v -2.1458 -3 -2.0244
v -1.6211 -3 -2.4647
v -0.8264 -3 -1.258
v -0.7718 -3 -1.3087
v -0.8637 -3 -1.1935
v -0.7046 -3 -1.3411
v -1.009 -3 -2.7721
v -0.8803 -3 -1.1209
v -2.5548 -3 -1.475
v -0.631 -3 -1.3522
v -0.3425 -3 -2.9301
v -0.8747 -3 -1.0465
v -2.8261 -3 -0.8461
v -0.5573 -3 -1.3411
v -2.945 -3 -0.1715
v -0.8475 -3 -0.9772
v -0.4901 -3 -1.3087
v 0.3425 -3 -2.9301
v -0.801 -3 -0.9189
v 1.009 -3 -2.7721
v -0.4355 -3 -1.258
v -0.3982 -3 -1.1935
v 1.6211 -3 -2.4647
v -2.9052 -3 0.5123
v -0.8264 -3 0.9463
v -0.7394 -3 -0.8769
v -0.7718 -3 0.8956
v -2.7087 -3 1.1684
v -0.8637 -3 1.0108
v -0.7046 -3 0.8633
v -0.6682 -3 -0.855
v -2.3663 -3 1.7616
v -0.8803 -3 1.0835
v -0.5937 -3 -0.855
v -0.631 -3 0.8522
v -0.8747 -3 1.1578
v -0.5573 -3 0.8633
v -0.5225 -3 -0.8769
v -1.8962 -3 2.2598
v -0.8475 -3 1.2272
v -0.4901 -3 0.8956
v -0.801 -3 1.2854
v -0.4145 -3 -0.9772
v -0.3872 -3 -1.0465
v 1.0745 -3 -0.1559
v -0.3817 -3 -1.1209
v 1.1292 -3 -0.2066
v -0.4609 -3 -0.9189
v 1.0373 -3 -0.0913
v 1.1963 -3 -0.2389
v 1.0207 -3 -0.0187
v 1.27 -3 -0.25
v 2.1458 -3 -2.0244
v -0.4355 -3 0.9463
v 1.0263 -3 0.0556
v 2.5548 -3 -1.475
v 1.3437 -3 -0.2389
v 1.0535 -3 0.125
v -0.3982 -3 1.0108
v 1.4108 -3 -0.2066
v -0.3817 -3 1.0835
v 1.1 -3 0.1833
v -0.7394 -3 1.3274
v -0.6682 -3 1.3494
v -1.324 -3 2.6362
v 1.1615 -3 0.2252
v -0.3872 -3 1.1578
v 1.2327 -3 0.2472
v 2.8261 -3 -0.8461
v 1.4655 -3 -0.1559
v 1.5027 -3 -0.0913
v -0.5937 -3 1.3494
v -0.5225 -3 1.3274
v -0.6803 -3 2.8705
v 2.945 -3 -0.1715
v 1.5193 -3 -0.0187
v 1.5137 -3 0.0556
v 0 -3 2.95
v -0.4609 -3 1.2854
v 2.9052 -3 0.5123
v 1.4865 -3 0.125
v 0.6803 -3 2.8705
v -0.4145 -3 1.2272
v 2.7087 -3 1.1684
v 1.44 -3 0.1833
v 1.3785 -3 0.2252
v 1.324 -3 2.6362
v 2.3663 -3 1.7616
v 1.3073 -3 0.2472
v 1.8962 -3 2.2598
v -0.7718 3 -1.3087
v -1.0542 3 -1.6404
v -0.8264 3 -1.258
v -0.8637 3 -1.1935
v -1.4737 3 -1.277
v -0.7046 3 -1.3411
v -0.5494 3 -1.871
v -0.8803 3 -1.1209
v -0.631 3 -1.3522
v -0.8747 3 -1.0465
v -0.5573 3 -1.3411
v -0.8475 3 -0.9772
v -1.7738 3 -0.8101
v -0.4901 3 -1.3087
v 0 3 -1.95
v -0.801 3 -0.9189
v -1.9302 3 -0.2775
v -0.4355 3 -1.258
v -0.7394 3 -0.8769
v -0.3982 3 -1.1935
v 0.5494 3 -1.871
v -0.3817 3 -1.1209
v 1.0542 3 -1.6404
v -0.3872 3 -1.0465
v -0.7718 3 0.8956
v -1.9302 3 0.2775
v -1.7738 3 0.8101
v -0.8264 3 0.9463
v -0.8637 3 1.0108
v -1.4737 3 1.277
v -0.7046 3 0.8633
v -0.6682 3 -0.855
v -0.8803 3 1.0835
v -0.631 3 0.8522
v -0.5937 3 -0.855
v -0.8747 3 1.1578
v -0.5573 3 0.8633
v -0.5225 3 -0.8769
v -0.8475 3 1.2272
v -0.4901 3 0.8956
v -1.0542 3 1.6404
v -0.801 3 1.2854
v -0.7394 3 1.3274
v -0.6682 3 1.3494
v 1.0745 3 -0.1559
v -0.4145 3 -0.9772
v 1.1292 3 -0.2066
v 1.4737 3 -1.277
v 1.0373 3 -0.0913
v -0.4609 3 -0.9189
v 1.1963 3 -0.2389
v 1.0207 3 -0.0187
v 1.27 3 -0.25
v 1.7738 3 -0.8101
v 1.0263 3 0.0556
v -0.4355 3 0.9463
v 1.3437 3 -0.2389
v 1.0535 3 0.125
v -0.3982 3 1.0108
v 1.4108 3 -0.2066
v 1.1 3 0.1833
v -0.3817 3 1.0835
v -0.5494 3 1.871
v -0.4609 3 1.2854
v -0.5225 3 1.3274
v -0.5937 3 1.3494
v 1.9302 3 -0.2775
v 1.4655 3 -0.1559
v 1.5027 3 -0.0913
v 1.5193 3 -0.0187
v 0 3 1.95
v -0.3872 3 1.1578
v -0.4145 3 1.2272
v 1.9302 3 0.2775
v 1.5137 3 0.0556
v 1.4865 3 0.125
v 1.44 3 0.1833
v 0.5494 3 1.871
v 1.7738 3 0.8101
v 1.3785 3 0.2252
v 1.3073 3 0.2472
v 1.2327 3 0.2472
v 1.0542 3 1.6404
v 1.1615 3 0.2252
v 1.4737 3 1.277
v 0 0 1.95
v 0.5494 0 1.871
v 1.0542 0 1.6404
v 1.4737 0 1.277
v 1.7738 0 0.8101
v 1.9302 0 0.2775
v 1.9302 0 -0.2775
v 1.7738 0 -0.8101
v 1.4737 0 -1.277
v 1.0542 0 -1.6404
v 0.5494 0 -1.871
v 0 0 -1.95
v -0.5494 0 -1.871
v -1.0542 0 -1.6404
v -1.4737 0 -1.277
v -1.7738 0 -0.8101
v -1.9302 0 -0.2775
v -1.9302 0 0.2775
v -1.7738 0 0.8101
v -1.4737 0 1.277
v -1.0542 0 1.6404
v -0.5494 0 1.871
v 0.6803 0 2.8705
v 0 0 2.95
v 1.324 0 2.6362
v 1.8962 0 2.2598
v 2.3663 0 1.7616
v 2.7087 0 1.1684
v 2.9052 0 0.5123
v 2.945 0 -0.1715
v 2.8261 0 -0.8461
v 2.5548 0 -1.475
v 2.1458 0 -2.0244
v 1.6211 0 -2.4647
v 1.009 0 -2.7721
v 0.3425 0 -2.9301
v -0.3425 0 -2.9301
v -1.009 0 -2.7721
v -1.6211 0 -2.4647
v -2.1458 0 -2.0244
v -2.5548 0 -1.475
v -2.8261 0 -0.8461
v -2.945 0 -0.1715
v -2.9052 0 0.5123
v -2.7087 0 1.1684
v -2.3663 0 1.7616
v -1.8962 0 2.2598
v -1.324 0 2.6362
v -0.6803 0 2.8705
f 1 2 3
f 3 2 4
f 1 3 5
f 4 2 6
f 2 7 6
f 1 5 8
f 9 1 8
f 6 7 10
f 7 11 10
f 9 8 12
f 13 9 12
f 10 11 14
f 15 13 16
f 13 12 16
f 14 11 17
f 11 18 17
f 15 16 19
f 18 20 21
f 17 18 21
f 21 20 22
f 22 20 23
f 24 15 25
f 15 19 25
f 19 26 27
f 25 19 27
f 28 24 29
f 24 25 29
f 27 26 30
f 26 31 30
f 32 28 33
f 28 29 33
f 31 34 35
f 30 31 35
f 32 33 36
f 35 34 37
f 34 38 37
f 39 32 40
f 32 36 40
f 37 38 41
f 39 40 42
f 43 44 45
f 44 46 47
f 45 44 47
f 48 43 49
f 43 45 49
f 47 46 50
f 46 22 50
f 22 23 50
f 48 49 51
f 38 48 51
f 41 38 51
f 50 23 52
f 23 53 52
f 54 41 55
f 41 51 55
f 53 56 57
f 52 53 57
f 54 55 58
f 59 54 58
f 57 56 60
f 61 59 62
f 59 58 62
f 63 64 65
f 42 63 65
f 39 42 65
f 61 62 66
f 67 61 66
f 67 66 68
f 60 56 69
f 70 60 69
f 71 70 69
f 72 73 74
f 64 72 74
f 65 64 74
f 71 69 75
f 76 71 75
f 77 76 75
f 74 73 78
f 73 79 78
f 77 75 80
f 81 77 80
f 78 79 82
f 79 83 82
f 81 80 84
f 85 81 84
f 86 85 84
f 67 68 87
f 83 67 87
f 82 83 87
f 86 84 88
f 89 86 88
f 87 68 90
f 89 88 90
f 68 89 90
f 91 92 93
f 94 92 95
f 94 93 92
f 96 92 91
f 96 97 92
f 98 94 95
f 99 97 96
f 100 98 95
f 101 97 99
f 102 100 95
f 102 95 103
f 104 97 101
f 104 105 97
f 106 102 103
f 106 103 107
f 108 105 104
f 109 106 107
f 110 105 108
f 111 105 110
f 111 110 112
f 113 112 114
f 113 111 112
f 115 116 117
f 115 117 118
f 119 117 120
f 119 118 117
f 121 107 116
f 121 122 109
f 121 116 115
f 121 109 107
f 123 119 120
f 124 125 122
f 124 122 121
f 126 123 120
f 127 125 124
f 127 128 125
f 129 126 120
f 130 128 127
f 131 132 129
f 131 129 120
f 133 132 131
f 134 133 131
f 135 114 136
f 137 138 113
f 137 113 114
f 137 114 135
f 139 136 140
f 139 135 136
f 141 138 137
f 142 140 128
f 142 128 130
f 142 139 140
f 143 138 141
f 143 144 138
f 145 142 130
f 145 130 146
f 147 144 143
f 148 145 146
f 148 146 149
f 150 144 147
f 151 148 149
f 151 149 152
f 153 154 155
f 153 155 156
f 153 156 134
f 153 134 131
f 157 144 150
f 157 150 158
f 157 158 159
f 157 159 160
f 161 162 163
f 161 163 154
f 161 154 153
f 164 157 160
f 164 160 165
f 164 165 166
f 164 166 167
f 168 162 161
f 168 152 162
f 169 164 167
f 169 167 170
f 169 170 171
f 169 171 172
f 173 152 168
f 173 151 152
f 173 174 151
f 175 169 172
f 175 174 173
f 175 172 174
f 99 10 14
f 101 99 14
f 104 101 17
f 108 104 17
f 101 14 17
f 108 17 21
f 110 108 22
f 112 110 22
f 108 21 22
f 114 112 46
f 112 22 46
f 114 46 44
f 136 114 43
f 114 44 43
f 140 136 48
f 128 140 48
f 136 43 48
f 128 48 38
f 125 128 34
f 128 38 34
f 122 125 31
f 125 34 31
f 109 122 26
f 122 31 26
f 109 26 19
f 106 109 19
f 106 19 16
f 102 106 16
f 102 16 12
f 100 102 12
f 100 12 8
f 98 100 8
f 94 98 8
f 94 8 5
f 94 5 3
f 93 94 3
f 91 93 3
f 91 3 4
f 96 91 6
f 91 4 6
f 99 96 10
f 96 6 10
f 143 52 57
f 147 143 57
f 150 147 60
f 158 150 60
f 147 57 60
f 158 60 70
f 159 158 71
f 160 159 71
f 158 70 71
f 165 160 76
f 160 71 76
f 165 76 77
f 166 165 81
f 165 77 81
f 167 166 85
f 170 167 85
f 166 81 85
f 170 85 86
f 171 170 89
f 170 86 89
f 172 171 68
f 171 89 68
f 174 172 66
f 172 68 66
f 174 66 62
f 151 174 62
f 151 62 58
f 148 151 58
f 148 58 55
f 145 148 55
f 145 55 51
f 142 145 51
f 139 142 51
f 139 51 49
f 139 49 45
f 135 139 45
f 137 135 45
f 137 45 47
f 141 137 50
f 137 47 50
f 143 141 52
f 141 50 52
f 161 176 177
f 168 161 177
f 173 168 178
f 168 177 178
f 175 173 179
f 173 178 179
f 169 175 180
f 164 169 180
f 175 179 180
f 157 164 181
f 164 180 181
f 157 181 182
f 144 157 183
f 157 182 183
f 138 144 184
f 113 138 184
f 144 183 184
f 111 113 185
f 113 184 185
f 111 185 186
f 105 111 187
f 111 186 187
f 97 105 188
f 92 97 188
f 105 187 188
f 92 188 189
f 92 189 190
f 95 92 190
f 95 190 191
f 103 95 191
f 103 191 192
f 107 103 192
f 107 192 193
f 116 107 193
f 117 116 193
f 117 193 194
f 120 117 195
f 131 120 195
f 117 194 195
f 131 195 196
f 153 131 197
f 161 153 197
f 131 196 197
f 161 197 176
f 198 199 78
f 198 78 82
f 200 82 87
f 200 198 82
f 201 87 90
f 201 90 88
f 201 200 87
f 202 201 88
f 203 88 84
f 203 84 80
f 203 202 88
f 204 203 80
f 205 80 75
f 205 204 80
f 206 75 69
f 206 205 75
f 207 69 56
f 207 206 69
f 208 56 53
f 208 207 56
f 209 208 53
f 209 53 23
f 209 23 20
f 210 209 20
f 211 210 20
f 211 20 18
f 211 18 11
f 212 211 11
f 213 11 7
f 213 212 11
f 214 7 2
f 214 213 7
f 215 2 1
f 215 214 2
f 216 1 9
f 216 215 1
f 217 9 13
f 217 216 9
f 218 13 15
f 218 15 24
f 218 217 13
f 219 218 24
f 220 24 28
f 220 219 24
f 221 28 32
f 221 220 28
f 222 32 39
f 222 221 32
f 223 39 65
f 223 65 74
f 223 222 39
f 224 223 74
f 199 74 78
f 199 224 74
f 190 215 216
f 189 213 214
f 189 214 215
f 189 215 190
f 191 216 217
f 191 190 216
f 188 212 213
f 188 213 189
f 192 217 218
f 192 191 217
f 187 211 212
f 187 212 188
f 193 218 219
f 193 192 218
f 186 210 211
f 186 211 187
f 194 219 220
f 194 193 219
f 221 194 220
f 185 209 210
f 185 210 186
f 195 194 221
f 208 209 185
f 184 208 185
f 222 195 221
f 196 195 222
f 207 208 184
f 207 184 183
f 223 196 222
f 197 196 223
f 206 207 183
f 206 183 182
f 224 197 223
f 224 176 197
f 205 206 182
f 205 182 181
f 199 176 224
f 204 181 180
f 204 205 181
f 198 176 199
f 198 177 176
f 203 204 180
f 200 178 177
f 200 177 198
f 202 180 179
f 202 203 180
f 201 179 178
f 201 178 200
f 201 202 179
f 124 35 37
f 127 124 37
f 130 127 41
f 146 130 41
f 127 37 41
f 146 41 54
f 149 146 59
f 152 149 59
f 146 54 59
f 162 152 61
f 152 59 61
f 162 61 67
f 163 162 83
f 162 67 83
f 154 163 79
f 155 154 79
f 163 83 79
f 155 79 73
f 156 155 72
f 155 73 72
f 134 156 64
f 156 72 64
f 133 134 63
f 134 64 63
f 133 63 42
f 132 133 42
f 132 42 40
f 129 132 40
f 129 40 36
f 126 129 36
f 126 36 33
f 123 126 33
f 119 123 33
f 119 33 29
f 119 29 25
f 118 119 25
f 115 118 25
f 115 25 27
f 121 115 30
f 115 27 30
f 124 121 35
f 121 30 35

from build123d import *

# Parameters (mm, degrees)
SKETCH_1_R          = 2.95
EXTRUDE_1_DEPTH     = 3
SKETCH_2_R          = 1.95
EXTRUDE_2_DEPTH     = 3
SKETCH_3_R          = 0.25
CUT_EXTRUDE_1_DEPTH = 6


with BuildPart() as part:
    # Эскиз1 → Бобышка-Вытянуть1 (new body)
    with BuildSketch(Plane(origin=(0, 0, 0), x_dir=(1, 0, 0), z_dir=(0, 1, 0))):
        with Locations(Location((0, 0, 0), (0, 0, 270))):
            Circle(SKETCH_1_R)
    extrude(amount=-EXTRUDE_1_DEPTH)

    # Эскиз2 → Бобышка-Вытянуть2 (add)
    with BuildSketch(Plane(origin=(0, 0, 0), x_dir=(1, 0, 0), z_dir=(0, 1, 0))):
        with Locations(Location((0, 0, 0), (0, 0, 270))):
            Circle(SKETCH_2_R)
    extrude(amount=EXTRUDE_2_DEPTH)

    # Эскиз3 → Вырез-Вытянуть1 (cut)
    with BuildSketch(Plane.XZ.offset(3)):
        with Locations(Location((1.27, 0, 0), (0, 0, 270))):
            Circle(SKETCH_3_R)
        with Locations(Location((-0.630957819, 1.102176134, 0), (0, 0, 270))):
            Circle(SKETCH_3_R)
        with Locations(Location((-0.630957819, -1.102176134, 0), (0, 0, 270))):
            Circle(SKETCH_3_R)
    extrude(amount=-CUT_EXTRUDE_1_DEPTH, mode=Mode.SUBTRACT)


solid = part.part
